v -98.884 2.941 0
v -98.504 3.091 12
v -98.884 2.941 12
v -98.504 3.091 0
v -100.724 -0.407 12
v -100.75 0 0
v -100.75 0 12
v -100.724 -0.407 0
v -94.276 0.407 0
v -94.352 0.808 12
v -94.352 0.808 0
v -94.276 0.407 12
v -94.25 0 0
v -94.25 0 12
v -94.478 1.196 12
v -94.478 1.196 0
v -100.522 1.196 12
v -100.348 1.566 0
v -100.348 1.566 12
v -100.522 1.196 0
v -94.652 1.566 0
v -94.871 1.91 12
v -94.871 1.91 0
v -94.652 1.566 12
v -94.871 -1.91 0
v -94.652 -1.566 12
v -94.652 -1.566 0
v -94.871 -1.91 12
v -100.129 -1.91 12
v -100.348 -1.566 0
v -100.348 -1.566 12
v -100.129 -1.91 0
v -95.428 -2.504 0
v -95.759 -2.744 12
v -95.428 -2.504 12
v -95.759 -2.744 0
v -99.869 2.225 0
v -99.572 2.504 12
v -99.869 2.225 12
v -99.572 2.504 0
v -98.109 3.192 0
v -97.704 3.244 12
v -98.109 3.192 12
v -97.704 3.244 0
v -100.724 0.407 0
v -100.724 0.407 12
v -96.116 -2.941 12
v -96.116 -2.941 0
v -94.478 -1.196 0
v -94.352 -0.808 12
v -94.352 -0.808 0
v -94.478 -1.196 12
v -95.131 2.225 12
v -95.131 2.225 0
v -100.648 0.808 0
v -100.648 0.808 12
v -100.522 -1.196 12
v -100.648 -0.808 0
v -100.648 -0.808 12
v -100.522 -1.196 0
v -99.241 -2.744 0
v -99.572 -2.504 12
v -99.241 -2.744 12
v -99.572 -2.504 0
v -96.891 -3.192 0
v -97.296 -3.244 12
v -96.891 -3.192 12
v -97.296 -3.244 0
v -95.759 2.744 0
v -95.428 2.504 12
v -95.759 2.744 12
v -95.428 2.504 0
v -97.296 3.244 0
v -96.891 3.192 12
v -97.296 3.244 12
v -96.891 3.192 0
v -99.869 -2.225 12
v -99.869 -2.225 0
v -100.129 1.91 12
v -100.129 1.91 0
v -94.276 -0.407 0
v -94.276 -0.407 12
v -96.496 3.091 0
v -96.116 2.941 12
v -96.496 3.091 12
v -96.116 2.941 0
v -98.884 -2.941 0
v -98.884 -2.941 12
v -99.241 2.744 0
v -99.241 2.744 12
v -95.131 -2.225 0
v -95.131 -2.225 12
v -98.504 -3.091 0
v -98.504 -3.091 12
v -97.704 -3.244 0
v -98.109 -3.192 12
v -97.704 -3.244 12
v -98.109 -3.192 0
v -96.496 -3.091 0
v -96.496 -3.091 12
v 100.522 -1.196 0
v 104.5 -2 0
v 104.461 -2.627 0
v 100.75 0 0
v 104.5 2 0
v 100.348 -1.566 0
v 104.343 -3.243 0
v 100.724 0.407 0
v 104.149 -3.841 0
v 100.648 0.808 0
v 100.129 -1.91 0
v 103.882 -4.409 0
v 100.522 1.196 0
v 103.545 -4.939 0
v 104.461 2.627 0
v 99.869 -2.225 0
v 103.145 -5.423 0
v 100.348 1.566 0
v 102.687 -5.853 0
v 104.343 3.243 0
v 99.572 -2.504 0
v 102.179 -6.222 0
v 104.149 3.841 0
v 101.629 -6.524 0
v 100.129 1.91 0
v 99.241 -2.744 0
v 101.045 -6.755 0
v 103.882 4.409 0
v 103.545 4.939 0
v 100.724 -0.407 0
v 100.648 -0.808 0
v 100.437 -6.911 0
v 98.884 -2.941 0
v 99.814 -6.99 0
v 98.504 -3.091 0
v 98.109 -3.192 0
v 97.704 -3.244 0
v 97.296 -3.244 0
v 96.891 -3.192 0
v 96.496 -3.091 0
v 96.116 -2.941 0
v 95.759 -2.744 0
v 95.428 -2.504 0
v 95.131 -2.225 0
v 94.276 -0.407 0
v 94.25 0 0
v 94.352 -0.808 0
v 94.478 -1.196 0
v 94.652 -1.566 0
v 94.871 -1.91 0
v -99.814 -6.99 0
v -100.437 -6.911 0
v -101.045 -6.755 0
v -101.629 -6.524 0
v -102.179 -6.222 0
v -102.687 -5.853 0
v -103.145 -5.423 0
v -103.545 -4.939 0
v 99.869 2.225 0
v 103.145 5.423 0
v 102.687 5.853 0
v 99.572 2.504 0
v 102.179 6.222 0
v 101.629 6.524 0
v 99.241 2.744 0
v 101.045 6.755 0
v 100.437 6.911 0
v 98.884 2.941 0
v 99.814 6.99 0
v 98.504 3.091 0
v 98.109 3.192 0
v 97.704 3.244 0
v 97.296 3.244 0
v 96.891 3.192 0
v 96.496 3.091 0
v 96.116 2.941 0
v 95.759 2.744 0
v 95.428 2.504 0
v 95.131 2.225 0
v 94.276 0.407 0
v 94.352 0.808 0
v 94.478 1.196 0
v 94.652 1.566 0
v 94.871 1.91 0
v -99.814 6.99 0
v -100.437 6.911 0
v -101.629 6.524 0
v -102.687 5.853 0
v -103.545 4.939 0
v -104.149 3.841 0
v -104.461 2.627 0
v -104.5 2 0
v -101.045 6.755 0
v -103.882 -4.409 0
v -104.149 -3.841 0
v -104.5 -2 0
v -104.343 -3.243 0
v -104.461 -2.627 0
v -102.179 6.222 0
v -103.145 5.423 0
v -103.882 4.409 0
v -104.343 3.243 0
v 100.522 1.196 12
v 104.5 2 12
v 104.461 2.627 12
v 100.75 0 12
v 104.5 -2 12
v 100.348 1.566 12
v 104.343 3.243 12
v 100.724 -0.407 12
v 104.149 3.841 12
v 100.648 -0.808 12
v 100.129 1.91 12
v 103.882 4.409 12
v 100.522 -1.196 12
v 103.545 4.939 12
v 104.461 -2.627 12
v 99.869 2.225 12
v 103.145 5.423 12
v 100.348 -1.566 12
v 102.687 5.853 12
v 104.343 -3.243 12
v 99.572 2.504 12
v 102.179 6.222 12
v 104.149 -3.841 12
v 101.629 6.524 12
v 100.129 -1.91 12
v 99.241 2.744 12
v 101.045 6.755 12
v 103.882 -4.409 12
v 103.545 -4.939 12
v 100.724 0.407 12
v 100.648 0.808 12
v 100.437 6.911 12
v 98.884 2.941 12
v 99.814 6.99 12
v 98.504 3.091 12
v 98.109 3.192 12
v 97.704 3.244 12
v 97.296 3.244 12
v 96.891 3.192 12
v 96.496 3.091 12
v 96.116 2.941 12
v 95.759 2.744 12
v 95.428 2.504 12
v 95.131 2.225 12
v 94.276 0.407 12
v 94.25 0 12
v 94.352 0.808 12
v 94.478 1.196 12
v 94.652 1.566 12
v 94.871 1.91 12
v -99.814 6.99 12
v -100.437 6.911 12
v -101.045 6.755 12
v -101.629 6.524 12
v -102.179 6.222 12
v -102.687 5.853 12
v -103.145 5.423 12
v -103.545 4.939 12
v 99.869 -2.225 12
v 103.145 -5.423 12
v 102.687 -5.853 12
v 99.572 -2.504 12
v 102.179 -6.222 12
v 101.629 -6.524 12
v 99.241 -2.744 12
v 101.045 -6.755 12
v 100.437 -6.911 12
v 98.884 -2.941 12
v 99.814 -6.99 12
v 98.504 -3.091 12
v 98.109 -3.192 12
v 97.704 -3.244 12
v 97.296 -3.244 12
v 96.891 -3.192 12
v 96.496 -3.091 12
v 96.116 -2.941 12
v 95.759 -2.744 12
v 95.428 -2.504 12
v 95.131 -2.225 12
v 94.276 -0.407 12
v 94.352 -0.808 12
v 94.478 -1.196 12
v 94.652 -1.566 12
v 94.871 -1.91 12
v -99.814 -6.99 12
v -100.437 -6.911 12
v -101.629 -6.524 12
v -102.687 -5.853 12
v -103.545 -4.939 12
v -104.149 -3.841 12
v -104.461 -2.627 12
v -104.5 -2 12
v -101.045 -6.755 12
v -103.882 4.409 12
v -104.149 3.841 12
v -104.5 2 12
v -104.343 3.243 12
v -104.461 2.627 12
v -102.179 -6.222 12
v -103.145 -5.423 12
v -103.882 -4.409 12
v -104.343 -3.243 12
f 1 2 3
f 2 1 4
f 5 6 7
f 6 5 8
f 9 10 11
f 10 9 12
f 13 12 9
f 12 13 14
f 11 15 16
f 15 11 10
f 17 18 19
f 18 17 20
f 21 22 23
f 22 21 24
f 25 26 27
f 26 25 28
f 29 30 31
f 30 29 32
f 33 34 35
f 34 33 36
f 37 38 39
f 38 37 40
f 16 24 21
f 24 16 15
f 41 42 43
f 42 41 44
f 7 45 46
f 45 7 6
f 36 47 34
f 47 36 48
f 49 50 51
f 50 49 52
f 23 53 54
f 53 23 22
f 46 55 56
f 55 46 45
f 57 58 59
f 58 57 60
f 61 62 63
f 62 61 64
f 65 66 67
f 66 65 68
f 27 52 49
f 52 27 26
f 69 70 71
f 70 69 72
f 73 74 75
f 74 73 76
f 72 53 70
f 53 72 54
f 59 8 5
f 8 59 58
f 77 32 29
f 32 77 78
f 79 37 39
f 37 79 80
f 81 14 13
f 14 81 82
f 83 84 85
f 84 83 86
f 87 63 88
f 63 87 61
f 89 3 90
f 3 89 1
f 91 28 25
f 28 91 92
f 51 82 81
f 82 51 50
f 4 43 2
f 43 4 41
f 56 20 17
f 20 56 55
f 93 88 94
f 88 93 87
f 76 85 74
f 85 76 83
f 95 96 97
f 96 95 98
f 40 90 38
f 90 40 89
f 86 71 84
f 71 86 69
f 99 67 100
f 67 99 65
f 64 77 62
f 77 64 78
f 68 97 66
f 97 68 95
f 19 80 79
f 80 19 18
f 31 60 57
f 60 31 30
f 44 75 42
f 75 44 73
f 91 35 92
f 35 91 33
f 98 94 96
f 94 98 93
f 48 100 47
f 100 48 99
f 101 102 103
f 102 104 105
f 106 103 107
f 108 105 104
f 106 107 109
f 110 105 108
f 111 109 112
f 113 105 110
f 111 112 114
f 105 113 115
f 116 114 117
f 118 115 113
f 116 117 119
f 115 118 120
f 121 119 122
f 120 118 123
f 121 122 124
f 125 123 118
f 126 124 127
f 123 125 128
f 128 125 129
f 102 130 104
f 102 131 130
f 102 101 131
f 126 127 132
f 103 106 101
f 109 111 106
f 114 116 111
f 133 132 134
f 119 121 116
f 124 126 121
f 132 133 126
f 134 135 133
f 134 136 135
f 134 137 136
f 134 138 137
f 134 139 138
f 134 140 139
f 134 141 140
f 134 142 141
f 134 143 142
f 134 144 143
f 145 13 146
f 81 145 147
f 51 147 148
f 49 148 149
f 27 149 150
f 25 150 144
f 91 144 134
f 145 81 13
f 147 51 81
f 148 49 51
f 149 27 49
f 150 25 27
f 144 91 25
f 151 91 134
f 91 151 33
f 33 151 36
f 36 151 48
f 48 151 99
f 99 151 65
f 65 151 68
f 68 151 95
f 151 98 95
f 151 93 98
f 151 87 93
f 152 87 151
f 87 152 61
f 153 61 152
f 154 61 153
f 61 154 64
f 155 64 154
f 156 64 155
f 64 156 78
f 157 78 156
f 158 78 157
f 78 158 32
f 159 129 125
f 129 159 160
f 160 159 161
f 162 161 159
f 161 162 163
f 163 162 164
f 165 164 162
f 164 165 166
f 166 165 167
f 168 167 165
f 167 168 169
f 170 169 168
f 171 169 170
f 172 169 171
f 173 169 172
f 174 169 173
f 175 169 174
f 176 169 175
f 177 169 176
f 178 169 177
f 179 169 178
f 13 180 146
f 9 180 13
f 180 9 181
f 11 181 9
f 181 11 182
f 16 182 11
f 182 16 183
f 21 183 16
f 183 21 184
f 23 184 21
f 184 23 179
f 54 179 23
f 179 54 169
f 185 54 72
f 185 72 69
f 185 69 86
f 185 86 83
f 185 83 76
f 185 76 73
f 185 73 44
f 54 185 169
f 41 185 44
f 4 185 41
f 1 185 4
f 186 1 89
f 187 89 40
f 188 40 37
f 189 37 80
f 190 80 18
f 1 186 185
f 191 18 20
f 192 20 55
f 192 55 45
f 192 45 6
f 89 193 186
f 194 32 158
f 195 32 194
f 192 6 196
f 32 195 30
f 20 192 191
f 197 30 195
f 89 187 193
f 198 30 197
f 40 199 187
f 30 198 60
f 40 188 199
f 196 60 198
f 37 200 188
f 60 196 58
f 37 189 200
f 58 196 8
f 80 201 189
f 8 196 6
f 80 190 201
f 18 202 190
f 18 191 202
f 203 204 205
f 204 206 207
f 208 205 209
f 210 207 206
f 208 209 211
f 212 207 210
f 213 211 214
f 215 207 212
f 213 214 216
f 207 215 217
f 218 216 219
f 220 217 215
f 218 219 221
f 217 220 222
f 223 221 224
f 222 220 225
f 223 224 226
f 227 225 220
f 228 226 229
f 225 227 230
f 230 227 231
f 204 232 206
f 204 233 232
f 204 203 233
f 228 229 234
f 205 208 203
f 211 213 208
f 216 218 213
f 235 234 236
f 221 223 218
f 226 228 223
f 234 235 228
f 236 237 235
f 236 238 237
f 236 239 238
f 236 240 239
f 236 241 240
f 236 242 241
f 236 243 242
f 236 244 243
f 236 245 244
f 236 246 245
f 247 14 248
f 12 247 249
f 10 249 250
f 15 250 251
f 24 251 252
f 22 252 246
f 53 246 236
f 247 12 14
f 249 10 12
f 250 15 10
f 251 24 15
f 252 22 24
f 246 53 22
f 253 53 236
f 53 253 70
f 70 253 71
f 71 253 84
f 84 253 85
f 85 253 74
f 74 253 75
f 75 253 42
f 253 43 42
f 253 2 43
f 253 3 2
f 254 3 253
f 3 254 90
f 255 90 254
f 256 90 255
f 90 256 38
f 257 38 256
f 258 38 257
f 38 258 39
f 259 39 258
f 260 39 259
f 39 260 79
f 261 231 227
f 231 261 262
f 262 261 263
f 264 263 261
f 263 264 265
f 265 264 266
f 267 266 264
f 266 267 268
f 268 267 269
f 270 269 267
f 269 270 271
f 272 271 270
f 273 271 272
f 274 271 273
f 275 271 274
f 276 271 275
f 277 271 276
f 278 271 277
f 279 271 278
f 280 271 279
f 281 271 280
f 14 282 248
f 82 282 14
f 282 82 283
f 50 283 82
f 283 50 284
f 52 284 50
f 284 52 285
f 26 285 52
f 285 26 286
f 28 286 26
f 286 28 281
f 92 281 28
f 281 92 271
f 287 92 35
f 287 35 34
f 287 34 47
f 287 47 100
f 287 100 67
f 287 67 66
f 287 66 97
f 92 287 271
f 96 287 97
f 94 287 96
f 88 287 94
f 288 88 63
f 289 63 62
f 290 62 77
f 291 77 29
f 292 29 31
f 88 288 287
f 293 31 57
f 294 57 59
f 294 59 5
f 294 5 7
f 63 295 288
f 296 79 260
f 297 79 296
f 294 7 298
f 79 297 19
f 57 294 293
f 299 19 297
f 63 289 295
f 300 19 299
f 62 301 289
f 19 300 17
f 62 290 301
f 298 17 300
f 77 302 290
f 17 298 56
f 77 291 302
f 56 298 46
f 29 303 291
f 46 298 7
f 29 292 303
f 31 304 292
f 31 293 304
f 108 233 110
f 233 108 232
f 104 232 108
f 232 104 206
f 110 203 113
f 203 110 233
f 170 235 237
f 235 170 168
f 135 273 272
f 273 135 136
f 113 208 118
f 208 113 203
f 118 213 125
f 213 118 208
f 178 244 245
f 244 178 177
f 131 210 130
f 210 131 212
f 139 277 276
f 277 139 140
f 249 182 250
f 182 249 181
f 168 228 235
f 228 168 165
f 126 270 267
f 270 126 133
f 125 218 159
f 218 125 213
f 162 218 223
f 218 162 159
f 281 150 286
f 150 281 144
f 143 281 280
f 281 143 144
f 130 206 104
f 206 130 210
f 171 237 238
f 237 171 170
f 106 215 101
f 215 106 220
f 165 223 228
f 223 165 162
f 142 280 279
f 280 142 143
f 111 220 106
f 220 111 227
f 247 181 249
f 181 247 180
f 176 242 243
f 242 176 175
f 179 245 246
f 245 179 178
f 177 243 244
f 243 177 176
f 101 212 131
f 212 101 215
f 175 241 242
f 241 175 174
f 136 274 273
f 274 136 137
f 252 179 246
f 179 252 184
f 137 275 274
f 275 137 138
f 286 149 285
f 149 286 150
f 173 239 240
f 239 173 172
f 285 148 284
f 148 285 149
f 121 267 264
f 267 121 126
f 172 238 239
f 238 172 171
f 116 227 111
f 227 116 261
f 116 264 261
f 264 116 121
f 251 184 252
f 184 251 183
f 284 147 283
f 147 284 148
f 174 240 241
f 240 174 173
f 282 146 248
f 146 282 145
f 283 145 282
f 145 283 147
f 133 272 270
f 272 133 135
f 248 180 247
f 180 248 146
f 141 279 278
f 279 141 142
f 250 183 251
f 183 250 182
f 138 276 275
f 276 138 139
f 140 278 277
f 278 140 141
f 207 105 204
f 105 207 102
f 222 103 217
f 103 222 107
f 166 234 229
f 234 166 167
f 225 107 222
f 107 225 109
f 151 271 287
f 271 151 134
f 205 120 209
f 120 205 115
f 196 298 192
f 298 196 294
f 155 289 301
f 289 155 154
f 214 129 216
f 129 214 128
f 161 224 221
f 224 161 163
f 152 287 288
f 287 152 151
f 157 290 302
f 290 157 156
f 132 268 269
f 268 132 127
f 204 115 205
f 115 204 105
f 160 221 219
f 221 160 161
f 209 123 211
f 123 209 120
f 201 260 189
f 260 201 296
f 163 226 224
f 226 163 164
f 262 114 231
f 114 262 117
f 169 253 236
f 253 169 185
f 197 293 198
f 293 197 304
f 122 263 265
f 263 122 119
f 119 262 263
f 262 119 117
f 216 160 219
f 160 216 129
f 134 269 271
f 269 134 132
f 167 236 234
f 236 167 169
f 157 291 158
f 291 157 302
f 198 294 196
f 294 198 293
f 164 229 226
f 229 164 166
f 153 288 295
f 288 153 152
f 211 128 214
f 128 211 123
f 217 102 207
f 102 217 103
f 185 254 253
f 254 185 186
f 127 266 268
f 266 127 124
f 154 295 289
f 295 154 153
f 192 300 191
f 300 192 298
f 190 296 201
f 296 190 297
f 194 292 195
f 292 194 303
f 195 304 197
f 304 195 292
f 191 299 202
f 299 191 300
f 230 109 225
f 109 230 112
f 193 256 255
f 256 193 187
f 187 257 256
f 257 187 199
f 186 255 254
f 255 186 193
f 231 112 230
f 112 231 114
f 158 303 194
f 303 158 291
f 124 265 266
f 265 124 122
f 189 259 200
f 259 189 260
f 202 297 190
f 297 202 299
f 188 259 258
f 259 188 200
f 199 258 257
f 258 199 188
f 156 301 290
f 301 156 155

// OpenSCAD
$fn = 50;


difference() {
	union() {
		hull() {
			translate(v = [-99.5000000000, 2.0000000000, 0]) {
				cylinder(h = 12, r = 5);
			}
			translate(v = [99.5000000000, 2.0000000000, 0]) {
				cylinder(h = 12, r = 5);
			}
			translate(v = [-99.5000000000, -2.0000000000, 0]) {
				cylinder(h = 12, r = 5);
			}
			translate(v = [99.5000000000, -2.0000000000, 0]) {
				cylinder(h = 12, r = 5);
			}
		}
	}
	union() {
		translate(v = [-97.5000000000, 0.0000000000, 0]) {
			cylinder(h = 12, r = 3.2500000000);
		}
		translate(v = [97.5000000000, 0.0000000000, 0]) {
			cylinder(h = 12, r = 3.2500000000);
		}
		translate(v = [-97.5000000000, 0.0000000000, 0]) {
			cylinder(h = 12, r = 1.8000000000);
		}
		translate(v = [97.5000000000, 0.0000000000, 0]) {
			cylinder(h = 12, r = 1.8000000000);
		}
		translate(v = [-97.5000000000, 0.0000000000, 0]) {
			cylinder(h = 12, r = 1.8000000000);
		}
		translate(v = [97.5000000000, 0.0000000000, 0]) {
			cylinder(h = 12, r = 1.8000000000);
		}
		translate(v = [-97.5000000000, 0.0000000000, 0]) {
			cylinder(h = 12, r = 1.8000000000);
		}
		translate(v = [97.5000000000, 0.0000000000, 0]) {
			cylinder(h = 12, r = 1.8000000000);
		}
	}
}
